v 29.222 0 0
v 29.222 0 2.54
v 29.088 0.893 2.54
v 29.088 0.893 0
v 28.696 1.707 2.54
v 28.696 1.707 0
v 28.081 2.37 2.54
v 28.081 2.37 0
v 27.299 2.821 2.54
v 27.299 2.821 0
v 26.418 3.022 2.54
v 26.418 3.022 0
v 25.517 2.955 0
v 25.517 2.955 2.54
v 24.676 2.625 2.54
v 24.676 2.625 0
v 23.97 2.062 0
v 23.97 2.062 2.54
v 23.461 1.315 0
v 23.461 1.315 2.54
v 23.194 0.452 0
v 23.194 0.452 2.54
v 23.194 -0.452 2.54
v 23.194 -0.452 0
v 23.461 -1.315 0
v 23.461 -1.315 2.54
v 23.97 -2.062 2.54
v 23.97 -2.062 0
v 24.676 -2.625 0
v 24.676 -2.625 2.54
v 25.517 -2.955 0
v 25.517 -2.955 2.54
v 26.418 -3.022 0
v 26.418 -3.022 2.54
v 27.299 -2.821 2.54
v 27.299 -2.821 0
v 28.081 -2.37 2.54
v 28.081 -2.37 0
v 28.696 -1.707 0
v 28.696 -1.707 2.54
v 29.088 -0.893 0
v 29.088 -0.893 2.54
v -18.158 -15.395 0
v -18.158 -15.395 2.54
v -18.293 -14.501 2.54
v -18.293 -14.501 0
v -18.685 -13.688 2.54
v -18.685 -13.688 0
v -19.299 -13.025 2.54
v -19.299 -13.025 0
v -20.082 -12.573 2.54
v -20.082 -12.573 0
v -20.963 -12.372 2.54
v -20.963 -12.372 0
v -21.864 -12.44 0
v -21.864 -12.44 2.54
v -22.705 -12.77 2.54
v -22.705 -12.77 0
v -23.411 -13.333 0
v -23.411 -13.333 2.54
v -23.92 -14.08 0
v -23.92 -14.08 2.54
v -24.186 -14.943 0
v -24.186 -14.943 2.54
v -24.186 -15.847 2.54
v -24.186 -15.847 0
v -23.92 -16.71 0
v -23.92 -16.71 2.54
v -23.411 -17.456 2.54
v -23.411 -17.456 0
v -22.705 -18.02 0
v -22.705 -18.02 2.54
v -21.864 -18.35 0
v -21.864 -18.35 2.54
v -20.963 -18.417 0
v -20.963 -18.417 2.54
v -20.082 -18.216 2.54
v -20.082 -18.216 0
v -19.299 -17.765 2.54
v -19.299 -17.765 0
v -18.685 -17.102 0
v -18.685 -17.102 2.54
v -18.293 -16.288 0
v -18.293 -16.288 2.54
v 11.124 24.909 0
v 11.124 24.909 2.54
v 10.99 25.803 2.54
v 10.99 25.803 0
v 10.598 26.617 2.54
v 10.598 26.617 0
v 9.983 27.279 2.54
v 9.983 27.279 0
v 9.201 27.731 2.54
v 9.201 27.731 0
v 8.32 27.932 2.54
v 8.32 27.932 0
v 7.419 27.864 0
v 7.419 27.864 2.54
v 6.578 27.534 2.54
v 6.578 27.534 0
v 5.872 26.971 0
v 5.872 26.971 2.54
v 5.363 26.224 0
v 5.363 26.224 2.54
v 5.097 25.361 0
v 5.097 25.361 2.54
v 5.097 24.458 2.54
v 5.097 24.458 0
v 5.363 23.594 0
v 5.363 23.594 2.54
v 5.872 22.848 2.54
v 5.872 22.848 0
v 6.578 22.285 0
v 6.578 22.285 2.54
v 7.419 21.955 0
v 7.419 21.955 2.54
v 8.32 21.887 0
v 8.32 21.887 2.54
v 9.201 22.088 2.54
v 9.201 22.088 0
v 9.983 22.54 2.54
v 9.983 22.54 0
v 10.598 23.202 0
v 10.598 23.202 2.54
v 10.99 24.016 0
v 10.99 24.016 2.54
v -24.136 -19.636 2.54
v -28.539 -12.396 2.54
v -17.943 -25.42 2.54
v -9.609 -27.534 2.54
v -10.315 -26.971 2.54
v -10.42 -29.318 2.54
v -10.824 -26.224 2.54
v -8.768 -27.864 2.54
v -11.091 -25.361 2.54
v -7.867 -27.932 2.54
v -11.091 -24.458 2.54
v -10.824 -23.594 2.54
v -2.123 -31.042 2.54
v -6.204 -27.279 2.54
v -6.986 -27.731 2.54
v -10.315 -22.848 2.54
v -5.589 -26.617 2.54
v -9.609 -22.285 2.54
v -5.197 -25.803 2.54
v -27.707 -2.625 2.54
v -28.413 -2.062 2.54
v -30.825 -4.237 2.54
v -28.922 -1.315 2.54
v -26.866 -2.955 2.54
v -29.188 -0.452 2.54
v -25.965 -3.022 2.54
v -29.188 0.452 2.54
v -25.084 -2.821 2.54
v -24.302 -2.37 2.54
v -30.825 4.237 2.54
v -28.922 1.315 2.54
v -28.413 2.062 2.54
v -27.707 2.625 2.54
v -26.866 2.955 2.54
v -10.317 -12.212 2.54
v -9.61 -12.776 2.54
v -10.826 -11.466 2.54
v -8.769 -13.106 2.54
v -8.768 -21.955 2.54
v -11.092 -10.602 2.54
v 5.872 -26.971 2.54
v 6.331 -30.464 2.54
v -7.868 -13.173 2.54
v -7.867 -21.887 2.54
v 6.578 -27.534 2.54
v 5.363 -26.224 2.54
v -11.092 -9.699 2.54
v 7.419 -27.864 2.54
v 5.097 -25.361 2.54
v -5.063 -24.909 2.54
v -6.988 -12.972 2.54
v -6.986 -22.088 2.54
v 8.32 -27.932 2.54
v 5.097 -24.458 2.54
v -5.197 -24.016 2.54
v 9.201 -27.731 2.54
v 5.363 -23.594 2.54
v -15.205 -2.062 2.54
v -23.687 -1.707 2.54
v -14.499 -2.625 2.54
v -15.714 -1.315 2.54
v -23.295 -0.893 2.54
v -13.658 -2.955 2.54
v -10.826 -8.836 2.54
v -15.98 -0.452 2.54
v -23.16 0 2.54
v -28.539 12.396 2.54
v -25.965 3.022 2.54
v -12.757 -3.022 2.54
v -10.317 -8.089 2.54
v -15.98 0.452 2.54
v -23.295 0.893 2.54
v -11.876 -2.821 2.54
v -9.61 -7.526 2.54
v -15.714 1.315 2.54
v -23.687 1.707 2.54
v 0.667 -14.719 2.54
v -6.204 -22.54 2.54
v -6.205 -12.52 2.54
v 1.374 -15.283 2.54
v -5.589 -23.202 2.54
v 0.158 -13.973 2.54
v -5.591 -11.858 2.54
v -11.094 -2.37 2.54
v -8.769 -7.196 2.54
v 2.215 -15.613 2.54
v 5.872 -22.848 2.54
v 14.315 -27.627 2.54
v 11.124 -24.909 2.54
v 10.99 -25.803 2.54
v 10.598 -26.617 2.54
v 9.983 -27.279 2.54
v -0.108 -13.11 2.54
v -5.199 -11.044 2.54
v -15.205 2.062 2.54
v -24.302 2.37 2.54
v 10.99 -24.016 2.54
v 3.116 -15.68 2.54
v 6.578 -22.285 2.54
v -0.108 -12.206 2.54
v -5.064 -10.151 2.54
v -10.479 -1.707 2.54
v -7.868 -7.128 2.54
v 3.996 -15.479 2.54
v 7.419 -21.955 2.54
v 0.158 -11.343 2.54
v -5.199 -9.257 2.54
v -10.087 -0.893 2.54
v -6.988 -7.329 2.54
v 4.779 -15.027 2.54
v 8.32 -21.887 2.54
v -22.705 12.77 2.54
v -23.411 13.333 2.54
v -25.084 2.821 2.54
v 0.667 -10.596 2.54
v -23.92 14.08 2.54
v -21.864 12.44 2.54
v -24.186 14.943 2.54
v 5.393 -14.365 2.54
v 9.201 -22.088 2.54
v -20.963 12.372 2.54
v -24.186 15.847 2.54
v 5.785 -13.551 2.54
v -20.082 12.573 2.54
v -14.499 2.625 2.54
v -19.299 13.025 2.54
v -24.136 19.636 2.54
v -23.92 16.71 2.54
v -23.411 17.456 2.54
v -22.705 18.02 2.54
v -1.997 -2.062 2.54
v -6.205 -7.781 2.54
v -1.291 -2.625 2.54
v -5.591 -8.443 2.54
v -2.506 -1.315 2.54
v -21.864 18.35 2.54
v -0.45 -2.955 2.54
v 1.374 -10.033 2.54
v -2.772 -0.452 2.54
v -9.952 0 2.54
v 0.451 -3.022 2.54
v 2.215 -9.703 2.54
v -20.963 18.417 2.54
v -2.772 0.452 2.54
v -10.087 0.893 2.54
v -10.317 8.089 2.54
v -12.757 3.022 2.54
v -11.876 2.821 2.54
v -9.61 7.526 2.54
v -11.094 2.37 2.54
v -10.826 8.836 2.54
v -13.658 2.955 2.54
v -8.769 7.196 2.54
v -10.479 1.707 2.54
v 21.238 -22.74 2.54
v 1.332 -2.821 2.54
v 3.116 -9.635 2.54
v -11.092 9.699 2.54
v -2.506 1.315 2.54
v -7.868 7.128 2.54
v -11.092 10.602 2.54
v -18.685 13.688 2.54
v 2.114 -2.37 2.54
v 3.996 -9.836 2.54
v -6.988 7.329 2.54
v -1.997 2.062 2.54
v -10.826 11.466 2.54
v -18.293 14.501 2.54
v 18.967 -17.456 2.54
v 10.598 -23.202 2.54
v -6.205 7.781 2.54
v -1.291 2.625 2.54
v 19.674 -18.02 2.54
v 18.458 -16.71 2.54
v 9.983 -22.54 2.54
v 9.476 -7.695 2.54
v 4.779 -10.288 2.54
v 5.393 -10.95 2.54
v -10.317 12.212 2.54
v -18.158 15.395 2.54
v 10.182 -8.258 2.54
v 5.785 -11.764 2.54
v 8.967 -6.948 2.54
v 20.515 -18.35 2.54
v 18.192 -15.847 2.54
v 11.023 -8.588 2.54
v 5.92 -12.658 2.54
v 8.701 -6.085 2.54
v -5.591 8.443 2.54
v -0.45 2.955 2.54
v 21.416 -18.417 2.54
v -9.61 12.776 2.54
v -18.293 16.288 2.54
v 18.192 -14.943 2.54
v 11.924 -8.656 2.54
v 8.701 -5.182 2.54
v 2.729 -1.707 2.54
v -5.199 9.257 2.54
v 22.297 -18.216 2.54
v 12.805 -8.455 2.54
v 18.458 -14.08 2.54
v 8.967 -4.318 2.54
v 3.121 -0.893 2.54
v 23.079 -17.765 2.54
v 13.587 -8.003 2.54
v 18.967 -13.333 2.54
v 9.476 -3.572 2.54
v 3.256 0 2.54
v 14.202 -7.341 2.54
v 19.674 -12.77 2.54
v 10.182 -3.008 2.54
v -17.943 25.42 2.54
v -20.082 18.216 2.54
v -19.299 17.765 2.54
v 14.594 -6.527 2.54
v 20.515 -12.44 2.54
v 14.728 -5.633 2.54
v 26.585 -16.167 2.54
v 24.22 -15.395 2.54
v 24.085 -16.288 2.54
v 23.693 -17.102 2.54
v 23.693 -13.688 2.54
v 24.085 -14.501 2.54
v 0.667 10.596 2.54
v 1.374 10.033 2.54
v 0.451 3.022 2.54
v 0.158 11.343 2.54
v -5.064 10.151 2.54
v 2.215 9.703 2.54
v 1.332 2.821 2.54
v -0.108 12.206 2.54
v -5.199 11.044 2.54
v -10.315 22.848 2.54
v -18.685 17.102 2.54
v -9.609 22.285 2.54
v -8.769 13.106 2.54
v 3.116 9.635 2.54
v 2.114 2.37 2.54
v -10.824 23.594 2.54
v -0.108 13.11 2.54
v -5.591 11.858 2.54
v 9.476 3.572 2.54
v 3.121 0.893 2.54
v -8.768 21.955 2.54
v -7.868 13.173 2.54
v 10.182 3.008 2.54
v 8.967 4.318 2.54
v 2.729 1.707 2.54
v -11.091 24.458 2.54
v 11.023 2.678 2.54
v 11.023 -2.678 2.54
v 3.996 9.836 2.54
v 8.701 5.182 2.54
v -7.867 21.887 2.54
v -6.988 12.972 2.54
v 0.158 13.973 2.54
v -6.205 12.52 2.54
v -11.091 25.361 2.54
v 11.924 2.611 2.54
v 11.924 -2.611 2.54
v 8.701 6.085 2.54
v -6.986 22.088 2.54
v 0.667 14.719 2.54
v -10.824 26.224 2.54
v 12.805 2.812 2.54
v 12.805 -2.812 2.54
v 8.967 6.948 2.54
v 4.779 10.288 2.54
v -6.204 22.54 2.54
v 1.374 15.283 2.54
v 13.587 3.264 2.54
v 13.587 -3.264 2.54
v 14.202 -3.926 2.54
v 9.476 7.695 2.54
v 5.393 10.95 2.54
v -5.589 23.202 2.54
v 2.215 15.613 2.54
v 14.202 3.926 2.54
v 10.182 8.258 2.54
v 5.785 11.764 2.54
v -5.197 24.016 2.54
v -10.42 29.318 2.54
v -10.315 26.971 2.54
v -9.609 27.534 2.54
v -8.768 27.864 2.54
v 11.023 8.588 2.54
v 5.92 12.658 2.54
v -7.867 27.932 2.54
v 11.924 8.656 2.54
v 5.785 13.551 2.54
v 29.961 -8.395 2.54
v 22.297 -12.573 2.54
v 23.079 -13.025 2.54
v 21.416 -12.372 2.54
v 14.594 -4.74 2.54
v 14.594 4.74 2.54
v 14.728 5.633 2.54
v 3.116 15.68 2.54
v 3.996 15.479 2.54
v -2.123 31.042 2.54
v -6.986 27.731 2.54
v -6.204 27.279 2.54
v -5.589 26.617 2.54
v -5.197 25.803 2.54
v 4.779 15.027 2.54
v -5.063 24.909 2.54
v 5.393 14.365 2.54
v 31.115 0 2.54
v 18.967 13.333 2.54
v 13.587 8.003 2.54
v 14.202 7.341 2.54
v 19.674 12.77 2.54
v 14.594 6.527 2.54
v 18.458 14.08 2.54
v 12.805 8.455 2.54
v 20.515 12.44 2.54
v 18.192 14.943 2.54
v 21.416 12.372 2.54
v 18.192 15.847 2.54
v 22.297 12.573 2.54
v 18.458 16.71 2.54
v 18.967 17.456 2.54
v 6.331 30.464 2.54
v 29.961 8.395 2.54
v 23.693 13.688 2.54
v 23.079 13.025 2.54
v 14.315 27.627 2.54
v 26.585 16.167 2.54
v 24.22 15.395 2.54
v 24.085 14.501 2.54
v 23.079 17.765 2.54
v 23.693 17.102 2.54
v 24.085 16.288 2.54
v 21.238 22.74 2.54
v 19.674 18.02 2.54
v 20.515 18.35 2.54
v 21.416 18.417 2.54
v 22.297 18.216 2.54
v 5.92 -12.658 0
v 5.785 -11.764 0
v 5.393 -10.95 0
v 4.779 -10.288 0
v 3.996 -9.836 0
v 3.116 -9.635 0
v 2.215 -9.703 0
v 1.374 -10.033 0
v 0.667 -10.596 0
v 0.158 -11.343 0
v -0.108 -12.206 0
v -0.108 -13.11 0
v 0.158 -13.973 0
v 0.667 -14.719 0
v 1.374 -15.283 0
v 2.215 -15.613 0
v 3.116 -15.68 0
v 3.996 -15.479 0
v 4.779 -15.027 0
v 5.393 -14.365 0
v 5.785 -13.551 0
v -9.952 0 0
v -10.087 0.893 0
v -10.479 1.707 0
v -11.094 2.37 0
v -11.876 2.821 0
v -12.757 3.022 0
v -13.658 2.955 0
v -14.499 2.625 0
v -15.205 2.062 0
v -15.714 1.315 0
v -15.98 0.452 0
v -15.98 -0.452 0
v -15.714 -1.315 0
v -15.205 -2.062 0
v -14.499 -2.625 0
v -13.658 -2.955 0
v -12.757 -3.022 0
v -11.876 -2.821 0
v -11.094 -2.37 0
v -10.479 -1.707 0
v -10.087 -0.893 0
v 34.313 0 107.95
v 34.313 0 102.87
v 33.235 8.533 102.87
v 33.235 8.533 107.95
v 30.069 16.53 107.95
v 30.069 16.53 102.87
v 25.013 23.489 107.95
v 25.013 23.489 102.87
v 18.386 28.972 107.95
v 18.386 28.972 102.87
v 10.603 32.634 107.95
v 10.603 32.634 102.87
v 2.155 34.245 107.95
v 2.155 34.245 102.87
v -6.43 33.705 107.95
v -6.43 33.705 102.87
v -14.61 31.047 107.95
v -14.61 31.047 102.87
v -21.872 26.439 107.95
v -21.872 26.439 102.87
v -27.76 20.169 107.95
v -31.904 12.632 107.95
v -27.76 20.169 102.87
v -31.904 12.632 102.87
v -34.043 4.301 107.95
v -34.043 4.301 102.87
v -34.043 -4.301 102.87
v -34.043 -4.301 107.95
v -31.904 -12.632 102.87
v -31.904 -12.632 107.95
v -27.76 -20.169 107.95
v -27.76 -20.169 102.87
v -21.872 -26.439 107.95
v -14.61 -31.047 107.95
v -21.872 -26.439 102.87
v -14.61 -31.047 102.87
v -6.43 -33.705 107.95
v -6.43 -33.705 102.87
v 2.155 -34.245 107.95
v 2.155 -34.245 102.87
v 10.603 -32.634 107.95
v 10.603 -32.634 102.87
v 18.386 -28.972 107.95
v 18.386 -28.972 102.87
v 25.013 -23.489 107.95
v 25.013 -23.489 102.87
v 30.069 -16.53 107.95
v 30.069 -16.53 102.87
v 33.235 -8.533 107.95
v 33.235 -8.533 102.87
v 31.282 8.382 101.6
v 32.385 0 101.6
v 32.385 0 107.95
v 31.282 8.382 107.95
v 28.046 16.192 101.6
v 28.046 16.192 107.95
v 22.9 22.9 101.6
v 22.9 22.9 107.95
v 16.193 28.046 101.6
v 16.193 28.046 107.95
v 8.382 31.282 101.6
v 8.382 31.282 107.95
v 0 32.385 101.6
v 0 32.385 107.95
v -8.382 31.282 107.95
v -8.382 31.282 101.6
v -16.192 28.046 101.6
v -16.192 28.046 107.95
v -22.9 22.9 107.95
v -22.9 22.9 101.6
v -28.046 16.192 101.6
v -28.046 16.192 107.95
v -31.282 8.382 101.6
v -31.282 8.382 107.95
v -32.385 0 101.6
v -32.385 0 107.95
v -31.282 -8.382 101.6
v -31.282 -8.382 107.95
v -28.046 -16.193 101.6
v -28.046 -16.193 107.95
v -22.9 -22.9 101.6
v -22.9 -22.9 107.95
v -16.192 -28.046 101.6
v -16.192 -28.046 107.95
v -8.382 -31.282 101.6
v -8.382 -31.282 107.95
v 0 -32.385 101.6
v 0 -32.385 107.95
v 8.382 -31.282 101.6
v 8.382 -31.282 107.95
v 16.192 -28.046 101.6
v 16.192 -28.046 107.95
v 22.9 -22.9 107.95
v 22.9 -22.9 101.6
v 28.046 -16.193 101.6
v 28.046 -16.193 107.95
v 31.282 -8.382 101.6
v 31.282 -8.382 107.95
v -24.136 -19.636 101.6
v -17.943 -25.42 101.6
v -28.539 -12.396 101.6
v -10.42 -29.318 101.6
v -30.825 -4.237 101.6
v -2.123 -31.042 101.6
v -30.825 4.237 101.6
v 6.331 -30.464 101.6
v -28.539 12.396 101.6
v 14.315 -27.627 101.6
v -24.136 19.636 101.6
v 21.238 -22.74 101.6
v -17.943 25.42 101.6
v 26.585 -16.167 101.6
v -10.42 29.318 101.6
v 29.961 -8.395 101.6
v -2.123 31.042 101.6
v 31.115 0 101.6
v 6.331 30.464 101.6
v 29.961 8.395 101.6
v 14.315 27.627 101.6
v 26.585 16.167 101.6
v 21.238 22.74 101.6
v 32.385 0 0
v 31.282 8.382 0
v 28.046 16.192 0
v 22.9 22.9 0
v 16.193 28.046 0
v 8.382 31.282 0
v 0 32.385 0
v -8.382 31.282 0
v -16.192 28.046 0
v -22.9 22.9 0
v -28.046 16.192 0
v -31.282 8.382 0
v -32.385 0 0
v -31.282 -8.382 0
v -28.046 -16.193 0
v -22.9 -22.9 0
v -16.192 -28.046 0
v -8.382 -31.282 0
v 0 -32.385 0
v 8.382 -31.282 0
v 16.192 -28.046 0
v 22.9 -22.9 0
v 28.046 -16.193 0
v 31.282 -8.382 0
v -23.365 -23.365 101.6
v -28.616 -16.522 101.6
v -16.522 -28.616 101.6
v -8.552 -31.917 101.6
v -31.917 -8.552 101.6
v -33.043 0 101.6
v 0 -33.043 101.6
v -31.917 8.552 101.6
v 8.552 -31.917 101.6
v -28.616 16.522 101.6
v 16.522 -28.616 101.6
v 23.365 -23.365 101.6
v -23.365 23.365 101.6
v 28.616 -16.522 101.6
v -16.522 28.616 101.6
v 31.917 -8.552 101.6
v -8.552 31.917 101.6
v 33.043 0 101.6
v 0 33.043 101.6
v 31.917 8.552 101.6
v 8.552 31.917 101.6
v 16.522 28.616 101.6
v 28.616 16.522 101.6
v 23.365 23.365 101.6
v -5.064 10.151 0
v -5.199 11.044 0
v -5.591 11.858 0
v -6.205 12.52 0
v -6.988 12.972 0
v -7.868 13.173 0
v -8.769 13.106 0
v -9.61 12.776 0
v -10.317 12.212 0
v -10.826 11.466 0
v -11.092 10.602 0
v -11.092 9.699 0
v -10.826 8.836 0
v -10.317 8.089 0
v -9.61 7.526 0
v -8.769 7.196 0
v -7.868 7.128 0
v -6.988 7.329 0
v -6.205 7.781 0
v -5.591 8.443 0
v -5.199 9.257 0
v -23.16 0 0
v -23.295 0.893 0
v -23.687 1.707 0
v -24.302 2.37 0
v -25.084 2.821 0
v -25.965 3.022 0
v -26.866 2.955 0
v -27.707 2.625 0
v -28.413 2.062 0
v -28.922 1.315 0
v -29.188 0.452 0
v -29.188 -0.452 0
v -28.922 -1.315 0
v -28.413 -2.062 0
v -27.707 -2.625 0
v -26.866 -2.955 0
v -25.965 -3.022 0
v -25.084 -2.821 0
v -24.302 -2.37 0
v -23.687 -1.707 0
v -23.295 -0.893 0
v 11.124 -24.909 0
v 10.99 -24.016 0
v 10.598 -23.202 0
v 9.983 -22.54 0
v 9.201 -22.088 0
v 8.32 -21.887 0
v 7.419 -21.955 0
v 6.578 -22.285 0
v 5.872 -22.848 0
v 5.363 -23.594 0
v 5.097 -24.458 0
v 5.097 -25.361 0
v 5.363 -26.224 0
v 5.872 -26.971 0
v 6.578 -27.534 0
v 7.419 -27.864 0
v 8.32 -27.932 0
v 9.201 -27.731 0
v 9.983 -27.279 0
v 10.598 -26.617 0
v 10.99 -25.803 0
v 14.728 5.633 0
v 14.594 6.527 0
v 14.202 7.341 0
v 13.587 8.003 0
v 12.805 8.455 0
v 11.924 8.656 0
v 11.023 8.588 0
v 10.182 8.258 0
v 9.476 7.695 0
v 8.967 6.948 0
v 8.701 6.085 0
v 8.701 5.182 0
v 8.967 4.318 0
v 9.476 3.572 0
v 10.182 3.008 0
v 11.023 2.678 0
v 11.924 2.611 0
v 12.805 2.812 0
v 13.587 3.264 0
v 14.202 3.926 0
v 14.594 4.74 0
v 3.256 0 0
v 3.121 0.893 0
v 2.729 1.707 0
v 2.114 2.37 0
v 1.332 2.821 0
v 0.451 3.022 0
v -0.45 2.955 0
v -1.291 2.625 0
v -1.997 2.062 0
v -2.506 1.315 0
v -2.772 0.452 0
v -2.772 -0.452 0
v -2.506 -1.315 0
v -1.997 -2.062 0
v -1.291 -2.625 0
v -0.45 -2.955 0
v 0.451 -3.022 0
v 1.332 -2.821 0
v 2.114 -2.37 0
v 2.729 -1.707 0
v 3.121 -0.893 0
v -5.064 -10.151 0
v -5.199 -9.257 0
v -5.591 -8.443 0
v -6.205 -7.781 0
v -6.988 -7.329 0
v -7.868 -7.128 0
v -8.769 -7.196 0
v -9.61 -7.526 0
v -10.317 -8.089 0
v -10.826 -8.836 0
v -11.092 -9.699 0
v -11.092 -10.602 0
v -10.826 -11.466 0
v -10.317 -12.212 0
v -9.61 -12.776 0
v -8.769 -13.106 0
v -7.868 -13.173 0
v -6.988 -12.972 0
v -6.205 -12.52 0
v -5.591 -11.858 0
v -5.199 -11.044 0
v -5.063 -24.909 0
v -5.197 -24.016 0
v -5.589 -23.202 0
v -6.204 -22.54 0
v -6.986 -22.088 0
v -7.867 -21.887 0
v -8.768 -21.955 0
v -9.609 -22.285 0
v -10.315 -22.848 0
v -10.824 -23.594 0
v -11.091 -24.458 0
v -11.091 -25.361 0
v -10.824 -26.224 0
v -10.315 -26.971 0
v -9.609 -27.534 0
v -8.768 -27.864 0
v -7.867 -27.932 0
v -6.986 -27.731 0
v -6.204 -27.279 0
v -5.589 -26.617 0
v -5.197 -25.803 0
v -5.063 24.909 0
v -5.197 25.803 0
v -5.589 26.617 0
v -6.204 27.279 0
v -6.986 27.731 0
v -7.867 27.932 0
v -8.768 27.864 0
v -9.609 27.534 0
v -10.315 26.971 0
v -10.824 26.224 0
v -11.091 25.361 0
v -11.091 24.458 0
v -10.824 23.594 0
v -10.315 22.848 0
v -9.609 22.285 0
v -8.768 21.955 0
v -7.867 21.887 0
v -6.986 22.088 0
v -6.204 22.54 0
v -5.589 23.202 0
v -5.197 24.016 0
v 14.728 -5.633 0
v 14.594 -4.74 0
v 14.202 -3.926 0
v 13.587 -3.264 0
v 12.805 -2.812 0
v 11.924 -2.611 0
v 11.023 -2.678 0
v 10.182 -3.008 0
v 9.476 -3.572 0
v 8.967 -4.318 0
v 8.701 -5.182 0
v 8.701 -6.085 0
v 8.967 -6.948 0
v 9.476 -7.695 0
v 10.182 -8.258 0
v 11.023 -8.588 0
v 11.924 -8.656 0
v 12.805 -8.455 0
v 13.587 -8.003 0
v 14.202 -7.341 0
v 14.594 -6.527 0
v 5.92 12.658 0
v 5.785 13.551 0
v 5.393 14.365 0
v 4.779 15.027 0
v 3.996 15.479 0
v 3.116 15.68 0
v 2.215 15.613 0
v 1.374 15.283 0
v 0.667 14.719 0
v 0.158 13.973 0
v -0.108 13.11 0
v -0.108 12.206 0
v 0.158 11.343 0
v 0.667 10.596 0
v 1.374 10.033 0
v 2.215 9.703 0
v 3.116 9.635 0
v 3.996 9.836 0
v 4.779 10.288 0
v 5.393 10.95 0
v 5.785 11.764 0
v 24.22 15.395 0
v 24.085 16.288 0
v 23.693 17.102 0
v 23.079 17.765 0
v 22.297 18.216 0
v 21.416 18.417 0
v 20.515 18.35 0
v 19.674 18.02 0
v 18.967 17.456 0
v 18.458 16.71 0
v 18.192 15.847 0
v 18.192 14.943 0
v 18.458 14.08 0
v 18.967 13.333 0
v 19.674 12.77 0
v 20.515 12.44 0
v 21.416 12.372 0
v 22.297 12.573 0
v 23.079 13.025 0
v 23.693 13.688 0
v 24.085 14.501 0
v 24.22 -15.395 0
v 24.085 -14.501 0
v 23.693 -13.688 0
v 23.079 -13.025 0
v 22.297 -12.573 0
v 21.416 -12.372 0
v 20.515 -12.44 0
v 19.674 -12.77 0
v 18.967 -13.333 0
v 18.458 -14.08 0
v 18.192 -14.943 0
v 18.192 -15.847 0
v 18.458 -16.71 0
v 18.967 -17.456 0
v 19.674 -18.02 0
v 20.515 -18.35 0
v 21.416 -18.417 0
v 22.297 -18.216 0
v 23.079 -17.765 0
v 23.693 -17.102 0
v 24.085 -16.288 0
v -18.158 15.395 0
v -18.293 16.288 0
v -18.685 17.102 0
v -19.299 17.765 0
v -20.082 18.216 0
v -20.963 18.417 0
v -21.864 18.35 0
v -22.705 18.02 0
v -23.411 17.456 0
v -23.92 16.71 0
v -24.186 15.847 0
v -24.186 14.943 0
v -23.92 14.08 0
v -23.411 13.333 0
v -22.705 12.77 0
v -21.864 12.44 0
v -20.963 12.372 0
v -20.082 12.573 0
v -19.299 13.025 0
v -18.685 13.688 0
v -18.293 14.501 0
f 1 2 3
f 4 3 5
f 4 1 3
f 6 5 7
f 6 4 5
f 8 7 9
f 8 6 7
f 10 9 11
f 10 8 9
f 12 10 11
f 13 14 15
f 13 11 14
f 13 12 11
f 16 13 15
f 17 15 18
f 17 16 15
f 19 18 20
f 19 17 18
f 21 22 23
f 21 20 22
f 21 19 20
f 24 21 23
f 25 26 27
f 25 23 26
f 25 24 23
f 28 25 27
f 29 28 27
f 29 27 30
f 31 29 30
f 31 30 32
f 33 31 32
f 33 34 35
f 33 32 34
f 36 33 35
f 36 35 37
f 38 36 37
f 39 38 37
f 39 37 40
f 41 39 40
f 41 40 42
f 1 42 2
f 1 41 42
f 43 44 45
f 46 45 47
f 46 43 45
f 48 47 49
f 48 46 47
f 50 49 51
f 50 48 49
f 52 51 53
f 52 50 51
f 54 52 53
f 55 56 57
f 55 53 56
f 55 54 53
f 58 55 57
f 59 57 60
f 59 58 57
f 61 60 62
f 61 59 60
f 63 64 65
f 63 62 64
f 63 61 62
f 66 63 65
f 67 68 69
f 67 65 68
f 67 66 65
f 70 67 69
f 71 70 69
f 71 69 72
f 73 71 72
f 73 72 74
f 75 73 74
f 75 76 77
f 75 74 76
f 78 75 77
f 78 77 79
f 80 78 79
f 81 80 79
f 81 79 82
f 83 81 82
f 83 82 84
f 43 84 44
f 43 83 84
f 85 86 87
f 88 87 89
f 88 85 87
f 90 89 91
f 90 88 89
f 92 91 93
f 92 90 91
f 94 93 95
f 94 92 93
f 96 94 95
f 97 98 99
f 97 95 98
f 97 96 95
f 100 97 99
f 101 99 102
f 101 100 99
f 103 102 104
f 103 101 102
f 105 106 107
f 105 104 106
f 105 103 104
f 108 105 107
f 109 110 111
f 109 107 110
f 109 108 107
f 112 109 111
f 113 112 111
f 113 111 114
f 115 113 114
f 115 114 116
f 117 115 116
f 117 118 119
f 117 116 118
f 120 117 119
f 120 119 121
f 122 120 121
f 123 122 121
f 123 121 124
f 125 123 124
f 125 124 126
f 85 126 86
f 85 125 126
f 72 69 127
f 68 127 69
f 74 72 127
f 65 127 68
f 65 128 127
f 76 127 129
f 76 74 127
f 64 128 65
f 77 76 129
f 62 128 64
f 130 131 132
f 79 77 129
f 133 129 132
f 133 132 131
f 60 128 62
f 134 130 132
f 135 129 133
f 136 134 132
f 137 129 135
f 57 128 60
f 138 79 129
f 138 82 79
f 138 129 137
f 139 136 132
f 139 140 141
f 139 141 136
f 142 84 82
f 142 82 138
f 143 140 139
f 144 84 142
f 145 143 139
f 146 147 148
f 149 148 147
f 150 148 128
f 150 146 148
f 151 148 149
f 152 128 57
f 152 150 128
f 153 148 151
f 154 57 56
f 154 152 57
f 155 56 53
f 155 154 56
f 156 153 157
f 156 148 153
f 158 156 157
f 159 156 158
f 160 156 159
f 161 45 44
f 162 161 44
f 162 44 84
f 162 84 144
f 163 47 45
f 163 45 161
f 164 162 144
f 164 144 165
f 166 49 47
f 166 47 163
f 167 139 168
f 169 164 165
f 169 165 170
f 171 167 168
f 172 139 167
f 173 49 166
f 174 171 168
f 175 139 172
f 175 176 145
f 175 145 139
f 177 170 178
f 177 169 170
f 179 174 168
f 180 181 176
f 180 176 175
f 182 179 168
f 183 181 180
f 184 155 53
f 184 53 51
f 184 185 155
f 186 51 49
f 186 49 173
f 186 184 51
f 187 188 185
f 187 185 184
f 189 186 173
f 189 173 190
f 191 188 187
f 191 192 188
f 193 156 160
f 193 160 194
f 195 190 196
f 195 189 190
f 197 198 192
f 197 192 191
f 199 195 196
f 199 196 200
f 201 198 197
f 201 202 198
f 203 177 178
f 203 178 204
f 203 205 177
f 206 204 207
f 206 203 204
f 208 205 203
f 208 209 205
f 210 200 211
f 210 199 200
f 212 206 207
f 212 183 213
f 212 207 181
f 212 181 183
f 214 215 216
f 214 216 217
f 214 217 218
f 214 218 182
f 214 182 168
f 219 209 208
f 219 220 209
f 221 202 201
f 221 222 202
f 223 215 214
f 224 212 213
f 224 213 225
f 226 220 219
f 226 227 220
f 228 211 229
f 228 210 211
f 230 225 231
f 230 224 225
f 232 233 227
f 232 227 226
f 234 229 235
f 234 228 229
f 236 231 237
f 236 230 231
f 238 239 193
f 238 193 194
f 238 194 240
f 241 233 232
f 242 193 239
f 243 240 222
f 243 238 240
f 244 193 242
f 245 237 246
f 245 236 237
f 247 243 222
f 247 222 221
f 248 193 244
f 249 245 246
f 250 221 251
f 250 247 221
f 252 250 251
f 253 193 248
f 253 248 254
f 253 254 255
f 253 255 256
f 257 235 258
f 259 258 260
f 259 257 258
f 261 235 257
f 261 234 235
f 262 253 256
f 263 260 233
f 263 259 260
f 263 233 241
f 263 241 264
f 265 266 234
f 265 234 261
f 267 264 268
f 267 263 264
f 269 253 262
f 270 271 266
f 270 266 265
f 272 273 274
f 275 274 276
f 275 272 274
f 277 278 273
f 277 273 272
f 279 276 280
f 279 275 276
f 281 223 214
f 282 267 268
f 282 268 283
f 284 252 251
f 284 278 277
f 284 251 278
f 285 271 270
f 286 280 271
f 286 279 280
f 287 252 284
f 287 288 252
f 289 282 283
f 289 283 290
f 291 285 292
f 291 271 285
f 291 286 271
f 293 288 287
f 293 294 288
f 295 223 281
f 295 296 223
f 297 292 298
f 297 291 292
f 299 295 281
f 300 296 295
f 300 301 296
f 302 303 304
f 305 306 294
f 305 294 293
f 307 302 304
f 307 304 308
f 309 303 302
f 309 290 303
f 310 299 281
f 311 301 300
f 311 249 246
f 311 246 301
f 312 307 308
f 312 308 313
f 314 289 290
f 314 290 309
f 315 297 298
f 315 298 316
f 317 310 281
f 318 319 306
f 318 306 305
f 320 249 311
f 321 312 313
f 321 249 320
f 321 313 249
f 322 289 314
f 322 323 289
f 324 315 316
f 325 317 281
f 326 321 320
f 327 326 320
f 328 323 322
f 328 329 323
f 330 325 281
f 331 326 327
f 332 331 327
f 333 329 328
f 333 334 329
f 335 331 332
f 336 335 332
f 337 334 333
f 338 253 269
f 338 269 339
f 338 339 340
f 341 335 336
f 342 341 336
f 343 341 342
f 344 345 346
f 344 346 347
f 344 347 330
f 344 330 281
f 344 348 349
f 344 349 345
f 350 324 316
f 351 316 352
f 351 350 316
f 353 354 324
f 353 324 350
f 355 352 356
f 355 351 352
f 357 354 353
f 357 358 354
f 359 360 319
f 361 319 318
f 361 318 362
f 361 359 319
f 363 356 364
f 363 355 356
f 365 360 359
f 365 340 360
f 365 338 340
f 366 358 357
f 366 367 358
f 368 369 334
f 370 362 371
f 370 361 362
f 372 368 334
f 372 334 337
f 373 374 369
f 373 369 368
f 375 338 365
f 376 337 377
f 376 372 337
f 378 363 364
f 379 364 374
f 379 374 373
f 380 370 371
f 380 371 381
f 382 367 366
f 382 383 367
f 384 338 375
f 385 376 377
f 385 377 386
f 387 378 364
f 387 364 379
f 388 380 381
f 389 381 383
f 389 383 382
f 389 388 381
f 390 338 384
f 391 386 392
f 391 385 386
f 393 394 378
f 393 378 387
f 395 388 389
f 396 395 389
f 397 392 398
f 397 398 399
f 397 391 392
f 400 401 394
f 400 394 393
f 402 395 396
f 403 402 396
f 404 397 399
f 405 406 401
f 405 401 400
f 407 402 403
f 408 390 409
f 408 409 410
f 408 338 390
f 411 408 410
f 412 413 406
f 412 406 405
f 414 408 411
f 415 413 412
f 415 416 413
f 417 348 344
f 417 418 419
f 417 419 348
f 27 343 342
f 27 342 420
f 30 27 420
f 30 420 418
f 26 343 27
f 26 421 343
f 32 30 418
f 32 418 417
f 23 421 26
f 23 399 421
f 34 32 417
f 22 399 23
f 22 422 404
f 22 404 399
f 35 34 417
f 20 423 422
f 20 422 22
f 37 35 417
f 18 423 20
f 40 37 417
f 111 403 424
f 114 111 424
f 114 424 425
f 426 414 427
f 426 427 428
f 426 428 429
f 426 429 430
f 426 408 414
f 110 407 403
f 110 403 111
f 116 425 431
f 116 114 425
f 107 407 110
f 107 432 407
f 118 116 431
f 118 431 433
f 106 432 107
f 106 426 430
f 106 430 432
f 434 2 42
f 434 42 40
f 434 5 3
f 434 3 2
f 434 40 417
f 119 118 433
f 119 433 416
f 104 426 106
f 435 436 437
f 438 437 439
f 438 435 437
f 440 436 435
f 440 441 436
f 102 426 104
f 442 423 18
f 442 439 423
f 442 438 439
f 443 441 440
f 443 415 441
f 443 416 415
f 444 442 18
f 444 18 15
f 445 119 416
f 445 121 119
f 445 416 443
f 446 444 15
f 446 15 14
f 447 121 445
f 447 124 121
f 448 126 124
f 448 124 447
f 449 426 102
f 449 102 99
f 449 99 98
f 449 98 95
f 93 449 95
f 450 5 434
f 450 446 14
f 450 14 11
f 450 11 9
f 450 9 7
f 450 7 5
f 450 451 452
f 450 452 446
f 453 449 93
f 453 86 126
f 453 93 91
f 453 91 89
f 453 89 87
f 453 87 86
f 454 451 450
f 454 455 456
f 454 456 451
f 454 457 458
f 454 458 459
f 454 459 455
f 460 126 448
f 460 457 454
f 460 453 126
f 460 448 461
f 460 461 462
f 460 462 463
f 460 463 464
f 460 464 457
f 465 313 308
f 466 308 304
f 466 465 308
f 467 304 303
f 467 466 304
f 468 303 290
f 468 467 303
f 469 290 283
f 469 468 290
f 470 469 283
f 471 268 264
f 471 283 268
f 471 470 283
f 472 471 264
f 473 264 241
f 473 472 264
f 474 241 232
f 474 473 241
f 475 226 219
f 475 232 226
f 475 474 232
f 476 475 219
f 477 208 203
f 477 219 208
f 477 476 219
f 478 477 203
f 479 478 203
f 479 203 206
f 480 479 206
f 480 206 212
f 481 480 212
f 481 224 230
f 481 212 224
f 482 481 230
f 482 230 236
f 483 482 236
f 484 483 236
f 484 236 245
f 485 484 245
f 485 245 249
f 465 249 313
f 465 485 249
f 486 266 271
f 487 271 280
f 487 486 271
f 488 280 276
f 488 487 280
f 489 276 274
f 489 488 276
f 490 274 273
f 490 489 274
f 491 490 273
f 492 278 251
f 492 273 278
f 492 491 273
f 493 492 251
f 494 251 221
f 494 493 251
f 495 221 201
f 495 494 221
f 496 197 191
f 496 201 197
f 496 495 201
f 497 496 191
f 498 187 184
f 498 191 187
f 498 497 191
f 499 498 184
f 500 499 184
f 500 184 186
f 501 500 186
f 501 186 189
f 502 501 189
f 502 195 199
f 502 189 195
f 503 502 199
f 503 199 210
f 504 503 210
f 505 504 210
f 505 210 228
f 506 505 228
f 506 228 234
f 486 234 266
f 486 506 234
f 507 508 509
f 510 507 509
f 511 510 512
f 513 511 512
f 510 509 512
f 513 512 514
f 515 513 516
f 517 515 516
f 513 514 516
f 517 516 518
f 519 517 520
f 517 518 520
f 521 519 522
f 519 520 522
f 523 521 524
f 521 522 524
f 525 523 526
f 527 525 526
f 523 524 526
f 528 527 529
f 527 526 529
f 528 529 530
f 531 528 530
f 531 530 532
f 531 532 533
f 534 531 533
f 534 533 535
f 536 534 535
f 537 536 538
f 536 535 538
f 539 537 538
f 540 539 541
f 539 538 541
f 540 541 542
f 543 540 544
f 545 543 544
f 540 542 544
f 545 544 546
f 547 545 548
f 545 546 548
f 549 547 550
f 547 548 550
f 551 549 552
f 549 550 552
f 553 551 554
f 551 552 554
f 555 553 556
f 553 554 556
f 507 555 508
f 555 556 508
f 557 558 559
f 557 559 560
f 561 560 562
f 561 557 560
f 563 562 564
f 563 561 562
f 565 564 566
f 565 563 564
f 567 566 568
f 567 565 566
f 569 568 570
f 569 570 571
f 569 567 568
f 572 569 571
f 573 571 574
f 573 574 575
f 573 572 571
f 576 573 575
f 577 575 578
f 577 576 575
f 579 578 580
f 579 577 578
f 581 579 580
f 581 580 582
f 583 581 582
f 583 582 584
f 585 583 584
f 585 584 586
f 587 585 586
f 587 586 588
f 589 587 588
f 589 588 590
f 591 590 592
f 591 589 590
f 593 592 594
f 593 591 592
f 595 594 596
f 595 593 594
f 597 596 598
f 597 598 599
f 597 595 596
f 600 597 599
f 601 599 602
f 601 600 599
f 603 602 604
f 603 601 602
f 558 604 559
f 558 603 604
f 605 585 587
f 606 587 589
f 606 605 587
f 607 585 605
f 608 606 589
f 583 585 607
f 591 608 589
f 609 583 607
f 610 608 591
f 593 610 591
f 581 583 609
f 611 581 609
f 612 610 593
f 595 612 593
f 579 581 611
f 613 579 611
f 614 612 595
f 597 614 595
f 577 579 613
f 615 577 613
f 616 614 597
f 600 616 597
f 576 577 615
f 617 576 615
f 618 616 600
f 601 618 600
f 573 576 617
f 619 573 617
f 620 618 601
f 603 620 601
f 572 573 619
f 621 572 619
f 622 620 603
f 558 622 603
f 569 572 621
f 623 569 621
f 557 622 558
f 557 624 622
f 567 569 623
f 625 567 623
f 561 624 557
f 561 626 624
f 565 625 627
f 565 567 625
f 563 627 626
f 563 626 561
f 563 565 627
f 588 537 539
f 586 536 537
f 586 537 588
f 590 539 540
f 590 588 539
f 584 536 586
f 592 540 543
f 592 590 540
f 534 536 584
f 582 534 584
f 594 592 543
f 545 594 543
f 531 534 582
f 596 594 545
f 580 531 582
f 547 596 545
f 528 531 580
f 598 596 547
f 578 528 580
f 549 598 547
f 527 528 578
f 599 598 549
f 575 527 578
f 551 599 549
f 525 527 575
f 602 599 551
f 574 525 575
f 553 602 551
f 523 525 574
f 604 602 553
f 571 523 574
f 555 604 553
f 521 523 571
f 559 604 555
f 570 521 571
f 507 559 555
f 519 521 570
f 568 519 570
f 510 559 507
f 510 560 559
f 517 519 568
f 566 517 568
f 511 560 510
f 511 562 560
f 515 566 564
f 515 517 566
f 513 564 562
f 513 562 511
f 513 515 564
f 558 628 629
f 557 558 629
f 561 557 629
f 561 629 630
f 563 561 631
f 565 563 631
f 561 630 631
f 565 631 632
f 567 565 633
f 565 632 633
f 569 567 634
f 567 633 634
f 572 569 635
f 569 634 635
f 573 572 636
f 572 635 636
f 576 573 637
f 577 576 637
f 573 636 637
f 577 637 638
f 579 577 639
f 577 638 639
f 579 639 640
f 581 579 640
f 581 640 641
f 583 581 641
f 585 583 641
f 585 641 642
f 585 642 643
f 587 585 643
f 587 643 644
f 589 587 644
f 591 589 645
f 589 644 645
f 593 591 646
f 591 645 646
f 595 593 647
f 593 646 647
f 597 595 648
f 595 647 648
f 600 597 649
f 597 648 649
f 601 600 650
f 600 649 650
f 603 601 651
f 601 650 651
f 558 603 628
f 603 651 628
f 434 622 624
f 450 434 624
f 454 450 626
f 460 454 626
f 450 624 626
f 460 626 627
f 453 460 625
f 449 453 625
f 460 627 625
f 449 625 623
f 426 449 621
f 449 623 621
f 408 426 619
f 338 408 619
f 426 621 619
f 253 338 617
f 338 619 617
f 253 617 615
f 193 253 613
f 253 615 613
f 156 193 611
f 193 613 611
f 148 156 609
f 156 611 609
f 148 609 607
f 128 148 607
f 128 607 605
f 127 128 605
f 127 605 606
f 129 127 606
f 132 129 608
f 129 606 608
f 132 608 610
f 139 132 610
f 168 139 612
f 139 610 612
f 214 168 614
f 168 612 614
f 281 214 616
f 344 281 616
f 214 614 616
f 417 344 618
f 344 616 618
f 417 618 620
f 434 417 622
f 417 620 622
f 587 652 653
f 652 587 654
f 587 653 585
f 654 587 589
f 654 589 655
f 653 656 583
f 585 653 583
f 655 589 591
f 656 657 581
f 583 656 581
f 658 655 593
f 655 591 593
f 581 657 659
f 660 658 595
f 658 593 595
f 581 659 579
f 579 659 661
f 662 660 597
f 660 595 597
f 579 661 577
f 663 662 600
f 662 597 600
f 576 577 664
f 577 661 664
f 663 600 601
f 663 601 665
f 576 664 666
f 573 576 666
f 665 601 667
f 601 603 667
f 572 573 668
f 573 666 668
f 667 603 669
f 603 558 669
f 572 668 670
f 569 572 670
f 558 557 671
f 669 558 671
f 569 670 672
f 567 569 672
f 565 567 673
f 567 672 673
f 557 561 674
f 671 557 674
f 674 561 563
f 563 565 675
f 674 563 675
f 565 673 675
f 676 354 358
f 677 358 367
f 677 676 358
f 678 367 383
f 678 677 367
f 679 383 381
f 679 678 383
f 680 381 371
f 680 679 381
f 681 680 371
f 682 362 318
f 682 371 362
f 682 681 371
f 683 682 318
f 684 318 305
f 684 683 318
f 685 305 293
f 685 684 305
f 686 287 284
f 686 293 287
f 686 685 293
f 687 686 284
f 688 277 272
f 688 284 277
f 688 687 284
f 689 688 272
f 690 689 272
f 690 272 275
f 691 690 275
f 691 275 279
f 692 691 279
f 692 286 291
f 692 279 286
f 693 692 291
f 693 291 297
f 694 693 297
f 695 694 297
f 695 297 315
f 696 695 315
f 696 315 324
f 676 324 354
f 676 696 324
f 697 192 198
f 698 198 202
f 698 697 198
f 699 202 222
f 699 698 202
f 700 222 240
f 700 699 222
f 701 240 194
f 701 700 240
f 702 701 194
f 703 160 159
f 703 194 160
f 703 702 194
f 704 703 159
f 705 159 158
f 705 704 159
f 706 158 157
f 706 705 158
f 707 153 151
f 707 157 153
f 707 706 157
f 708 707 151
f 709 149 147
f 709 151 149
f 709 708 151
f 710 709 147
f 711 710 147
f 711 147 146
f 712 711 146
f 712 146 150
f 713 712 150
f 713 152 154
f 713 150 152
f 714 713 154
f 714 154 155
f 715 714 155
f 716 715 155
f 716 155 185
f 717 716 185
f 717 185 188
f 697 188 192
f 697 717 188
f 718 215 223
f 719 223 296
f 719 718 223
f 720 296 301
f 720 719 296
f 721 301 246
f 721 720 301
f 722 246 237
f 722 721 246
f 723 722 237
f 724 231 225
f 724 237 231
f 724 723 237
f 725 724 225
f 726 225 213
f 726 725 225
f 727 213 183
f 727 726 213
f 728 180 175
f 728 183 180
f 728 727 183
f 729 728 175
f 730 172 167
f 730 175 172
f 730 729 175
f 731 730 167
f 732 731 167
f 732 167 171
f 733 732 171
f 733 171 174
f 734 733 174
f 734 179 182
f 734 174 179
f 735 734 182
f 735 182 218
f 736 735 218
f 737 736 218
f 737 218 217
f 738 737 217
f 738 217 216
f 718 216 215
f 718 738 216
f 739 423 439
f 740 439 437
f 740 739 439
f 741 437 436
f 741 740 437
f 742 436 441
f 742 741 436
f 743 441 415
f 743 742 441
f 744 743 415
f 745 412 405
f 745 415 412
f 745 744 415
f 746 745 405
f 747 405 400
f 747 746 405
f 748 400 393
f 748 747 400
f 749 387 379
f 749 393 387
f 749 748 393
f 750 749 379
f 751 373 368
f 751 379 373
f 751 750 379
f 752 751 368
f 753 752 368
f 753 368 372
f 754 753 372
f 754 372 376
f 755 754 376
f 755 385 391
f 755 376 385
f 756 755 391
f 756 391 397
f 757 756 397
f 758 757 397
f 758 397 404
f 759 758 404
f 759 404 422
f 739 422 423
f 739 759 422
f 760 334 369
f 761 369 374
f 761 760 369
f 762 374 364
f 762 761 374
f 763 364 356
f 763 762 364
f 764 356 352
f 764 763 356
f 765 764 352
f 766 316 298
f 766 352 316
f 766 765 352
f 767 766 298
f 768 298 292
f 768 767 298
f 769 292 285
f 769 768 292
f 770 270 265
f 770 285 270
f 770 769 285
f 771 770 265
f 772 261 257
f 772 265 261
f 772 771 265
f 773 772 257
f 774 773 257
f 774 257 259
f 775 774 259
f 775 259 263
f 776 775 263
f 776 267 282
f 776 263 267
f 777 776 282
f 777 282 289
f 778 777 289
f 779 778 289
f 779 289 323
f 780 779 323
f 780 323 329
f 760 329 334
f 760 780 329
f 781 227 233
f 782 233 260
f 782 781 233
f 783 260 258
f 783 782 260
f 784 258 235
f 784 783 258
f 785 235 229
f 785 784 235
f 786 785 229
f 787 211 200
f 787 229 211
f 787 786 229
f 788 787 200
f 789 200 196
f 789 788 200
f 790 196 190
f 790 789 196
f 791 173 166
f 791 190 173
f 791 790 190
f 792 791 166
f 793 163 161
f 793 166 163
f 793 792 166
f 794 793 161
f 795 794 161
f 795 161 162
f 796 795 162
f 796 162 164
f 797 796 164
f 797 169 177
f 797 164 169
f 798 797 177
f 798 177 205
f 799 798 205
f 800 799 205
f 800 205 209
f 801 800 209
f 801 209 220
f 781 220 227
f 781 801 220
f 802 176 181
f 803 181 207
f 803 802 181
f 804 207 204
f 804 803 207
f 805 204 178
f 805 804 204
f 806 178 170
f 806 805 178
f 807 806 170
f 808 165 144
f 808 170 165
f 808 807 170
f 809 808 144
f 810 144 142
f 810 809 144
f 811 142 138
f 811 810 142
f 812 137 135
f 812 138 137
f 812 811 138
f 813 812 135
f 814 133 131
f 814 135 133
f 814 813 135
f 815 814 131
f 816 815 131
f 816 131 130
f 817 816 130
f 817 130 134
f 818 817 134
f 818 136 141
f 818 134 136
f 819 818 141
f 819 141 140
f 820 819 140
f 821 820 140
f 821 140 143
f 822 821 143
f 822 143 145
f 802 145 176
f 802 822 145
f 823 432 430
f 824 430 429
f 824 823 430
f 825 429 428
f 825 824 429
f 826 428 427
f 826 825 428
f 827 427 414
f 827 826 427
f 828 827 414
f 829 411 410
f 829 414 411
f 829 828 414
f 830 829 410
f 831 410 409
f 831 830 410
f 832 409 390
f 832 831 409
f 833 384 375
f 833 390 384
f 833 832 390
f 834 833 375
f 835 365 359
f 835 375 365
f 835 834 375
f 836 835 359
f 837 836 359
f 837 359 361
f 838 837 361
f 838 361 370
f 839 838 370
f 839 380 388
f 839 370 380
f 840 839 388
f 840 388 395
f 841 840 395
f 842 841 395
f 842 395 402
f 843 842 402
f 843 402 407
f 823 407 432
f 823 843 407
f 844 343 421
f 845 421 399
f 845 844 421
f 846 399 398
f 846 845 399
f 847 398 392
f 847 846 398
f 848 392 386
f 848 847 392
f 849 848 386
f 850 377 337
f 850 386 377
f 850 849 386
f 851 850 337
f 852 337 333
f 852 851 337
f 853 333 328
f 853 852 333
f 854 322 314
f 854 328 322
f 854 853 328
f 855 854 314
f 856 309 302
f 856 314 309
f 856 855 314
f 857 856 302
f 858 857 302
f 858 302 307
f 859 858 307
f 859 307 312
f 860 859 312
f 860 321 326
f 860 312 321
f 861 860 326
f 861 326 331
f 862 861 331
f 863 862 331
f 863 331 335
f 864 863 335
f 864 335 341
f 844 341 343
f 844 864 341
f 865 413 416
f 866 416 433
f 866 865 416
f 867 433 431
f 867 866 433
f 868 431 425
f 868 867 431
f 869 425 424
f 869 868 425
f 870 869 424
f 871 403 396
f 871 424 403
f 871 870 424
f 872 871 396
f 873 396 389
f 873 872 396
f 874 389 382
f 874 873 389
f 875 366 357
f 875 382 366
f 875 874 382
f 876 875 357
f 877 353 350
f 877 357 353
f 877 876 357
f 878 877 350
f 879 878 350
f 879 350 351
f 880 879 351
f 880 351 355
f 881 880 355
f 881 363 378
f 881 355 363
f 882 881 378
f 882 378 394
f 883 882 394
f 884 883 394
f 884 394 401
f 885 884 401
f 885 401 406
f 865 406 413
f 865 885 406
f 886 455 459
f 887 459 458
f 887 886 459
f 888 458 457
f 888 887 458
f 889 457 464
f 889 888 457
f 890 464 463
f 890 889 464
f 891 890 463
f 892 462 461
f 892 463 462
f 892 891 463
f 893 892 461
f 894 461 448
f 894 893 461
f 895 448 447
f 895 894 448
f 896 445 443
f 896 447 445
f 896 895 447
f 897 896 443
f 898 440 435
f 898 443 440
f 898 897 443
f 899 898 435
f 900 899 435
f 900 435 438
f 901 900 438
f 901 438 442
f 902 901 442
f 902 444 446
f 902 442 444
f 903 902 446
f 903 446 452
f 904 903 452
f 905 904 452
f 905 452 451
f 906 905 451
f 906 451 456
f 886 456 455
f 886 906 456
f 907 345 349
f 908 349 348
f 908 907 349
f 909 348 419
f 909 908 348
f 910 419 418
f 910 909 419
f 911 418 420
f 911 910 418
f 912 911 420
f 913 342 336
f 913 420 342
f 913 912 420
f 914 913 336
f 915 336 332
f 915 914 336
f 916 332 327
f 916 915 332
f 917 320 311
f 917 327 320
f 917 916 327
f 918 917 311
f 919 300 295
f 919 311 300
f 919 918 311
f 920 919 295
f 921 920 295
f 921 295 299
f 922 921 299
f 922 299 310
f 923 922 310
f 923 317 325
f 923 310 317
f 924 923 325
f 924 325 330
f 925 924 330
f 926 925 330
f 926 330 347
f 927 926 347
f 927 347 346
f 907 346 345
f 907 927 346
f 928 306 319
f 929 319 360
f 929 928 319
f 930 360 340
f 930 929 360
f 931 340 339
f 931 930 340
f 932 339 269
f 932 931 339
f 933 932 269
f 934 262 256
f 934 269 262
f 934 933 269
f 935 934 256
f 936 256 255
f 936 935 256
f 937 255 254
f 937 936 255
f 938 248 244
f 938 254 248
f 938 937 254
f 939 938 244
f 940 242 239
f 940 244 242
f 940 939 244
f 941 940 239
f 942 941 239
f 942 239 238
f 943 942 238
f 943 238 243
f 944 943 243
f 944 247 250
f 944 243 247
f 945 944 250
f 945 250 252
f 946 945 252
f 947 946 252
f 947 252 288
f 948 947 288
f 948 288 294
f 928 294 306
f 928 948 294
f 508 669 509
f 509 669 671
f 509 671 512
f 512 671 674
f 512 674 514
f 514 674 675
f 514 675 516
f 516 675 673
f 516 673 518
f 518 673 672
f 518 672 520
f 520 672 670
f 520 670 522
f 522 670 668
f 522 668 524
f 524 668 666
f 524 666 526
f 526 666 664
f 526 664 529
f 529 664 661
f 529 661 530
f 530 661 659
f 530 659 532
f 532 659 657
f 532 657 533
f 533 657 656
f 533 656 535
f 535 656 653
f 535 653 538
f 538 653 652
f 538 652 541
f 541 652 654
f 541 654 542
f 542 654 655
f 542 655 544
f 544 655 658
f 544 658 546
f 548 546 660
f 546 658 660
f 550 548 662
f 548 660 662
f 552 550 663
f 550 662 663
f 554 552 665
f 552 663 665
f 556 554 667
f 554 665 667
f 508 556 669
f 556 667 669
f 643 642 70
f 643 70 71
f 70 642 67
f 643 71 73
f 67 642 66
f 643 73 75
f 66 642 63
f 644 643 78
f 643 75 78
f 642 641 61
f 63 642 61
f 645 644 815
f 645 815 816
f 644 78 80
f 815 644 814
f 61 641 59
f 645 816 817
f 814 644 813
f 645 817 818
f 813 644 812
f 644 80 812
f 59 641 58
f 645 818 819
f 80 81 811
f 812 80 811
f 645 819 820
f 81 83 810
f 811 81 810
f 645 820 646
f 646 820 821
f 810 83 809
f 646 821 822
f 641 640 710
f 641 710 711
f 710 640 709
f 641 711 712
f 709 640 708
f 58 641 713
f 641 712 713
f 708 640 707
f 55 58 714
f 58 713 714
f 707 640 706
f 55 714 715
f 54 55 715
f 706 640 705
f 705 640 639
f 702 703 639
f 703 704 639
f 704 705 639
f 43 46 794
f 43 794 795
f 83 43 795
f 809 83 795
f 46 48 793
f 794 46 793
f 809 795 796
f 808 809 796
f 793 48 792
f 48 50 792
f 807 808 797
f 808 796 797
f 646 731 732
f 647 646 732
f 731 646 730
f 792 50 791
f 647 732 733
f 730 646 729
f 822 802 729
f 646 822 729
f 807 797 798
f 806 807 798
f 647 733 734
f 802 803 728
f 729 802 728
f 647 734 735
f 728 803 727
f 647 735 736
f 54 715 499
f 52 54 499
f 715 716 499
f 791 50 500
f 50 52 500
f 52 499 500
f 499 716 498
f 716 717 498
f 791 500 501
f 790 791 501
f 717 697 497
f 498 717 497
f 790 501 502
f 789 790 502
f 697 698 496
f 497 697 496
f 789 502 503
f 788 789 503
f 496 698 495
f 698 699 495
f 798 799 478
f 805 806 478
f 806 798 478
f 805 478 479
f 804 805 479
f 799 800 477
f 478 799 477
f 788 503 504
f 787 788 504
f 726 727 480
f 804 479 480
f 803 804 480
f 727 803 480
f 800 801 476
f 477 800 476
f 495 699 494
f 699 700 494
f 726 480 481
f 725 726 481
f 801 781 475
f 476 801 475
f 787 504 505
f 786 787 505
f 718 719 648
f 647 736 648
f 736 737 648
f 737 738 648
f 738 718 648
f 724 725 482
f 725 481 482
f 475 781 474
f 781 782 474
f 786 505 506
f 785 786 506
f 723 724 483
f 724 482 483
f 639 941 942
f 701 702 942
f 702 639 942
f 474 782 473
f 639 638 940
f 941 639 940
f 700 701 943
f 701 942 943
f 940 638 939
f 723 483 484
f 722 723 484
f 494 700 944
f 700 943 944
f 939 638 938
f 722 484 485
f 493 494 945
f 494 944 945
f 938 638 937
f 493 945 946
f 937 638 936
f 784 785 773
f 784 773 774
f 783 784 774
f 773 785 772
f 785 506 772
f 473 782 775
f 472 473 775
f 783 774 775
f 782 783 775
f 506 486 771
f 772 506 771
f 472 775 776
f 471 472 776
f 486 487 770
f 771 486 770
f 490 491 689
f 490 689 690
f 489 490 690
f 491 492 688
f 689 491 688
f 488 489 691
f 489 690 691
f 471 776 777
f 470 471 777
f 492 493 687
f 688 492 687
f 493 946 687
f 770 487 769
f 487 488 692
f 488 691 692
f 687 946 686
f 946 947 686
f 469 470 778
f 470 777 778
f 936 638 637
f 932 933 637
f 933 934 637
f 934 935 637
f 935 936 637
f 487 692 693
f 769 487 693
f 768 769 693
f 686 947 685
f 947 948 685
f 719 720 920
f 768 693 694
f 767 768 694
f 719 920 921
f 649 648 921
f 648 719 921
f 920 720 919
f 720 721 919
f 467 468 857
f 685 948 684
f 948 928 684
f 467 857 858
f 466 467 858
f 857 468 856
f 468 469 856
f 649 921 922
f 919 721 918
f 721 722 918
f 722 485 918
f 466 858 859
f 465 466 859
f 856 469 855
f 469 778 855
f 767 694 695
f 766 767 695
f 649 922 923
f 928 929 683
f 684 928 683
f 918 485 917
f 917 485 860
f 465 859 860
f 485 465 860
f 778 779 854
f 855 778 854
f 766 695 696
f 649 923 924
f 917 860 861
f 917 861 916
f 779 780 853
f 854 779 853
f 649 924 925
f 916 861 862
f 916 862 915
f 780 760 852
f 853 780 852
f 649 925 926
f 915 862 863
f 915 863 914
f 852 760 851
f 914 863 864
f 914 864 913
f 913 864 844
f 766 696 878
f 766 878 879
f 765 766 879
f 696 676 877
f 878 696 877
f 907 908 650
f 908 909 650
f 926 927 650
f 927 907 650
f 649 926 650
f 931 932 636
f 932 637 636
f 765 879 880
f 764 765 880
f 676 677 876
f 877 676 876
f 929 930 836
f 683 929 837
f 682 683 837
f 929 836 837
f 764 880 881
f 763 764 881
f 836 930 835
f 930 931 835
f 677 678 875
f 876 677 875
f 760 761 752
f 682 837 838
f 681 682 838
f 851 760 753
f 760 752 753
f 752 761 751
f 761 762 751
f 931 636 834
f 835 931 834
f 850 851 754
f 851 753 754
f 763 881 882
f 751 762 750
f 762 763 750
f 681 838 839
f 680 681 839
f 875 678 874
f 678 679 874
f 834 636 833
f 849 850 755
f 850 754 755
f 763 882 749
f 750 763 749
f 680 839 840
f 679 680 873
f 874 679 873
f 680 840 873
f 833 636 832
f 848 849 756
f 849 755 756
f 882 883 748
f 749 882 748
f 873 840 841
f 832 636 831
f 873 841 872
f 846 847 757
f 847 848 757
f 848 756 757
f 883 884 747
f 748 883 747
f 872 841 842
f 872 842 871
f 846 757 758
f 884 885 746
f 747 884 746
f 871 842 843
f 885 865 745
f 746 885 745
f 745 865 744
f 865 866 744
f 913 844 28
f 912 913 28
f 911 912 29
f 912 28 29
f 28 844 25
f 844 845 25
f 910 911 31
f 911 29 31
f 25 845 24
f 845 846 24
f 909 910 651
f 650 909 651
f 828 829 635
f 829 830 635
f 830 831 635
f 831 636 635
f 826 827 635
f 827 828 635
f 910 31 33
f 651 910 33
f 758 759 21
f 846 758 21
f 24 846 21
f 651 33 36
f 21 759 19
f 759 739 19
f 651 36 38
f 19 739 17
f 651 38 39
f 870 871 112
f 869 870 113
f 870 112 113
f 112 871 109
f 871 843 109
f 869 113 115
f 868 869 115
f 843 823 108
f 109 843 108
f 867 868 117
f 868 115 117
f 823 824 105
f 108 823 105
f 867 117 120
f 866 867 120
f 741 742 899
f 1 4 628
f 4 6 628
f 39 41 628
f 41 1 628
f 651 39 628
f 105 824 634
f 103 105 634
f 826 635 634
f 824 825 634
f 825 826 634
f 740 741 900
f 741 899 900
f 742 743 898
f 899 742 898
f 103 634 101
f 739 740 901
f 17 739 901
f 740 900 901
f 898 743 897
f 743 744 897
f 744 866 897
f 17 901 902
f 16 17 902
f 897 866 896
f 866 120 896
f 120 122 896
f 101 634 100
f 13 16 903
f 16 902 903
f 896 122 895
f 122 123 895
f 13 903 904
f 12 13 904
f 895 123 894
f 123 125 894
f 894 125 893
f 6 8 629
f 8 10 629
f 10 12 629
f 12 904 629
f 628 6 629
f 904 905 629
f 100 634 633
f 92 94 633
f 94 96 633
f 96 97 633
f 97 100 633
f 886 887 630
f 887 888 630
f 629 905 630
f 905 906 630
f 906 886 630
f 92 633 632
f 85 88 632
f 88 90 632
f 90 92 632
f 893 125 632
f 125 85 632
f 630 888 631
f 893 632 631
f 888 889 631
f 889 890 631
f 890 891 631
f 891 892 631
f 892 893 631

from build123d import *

# Parameters (mm, degrees)
F0_R          = 32.385
F1_DEPTH      = 101.6
F2_R          = 31.115
F3_DEPTH      = 99.06
F4_R          = 3.0308866689
F5_DEPTH      = 88.9
F5_DEPTH_BACK = 6.35
F6_R          = 34.3131351295
F6_R_2        = 32.385
F7_DEPTH      = 6.35
F8_SIZE       = 1.27


with BuildPart() as f1:
    # F0 (on Top) → F1 (new body)
    with BuildSketch(Plane.XY):
        Circle(F0_R)
    extrude(amount=F1_DEPTH)

    # F2 (on face) → F3 (cut)
    with BuildSketch(Plane.XY.offset(101.6)):
        Circle(F2_R)
    extrude(amount=-F3_DEPTH, mode=Mode.SUBTRACT)

    # F4 (on face) → F5 (cut, two sides)
    with BuildSketch(Plane.XY) as f5_sk:
        with Locations((-26.1913072318, 0)):
            Circle(F4_R)
        with Locations((-12.9833072318, 0)):
            Circle(F4_R)
        with Locations((0.2246927682, 0)):
            Circle(F4_R)
        with Locations((-21.1892126554, -15.3948641291)):
            Circle(F4_R)
        with Locations((-8.0935590395, -24.9094134131)):
            Circle(F4_R)
        with Locations((8.0935590395, -24.9094134131)):
            Circle(F4_R)
        with Locations((21.1892126554, -15.3948641291)):
            Circle(F4_R)
        with Locations((26.1913072318, 0)):
            Circle(F4_R)
        with Locations((21.1892126554, 15.3948641291)):
            Circle(F4_R)
        with Locations((8.0935590395, 24.9094134131)):
            Circle(F4_R)
        with Locations((-8.0935590395, 24.9094134131)):
            Circle(F4_R)
        with Locations((-21.1892126554, 15.3948641291)):
            Circle(F4_R)
        with Locations((-8.0949596534, -10.1507583404)):
            Circle(F4_R)
        with Locations((2.8890576511, -12.6577886127)):
            Circle(F4_R)
        with Locations((11.6975556182, -5.6332458878)):
            Circle(F4_R)
        with Locations((11.6975556182, 5.6332458878)):
            Circle(F4_R)
        with Locations((2.8890576511, 12.6577886127)):
            Circle(F4_R)
        with Locations((-8.0949596534, 10.1507583404)):
            Circle(F4_R)
    extrude(amount=-F5_DEPTH, mode=Mode.SUBTRACT)
    extrude(f5_sk.sketch, amount=F5_DEPTH_BACK, mode=Mode.SUBTRACT)


with BuildPart() as f7:
    # F6 (on face) → F7 (new body)
    with BuildSketch(Plane.XY.offset(101.6)):
        Circle(F6_R)
        Circle(F6_R_2, mode=Mode.SUBTRACT)
    extrude(amount=F7_DEPTH)

    # F8
    f8_edges = [f7.edges().sort_by_distance(p)[0] for p in [
        (-34.313135, 0, 101.6),
    ]]
    chamfer(f8_edges, length=F8_SIZE)


solid = Compound([f1.part, f7.part])
